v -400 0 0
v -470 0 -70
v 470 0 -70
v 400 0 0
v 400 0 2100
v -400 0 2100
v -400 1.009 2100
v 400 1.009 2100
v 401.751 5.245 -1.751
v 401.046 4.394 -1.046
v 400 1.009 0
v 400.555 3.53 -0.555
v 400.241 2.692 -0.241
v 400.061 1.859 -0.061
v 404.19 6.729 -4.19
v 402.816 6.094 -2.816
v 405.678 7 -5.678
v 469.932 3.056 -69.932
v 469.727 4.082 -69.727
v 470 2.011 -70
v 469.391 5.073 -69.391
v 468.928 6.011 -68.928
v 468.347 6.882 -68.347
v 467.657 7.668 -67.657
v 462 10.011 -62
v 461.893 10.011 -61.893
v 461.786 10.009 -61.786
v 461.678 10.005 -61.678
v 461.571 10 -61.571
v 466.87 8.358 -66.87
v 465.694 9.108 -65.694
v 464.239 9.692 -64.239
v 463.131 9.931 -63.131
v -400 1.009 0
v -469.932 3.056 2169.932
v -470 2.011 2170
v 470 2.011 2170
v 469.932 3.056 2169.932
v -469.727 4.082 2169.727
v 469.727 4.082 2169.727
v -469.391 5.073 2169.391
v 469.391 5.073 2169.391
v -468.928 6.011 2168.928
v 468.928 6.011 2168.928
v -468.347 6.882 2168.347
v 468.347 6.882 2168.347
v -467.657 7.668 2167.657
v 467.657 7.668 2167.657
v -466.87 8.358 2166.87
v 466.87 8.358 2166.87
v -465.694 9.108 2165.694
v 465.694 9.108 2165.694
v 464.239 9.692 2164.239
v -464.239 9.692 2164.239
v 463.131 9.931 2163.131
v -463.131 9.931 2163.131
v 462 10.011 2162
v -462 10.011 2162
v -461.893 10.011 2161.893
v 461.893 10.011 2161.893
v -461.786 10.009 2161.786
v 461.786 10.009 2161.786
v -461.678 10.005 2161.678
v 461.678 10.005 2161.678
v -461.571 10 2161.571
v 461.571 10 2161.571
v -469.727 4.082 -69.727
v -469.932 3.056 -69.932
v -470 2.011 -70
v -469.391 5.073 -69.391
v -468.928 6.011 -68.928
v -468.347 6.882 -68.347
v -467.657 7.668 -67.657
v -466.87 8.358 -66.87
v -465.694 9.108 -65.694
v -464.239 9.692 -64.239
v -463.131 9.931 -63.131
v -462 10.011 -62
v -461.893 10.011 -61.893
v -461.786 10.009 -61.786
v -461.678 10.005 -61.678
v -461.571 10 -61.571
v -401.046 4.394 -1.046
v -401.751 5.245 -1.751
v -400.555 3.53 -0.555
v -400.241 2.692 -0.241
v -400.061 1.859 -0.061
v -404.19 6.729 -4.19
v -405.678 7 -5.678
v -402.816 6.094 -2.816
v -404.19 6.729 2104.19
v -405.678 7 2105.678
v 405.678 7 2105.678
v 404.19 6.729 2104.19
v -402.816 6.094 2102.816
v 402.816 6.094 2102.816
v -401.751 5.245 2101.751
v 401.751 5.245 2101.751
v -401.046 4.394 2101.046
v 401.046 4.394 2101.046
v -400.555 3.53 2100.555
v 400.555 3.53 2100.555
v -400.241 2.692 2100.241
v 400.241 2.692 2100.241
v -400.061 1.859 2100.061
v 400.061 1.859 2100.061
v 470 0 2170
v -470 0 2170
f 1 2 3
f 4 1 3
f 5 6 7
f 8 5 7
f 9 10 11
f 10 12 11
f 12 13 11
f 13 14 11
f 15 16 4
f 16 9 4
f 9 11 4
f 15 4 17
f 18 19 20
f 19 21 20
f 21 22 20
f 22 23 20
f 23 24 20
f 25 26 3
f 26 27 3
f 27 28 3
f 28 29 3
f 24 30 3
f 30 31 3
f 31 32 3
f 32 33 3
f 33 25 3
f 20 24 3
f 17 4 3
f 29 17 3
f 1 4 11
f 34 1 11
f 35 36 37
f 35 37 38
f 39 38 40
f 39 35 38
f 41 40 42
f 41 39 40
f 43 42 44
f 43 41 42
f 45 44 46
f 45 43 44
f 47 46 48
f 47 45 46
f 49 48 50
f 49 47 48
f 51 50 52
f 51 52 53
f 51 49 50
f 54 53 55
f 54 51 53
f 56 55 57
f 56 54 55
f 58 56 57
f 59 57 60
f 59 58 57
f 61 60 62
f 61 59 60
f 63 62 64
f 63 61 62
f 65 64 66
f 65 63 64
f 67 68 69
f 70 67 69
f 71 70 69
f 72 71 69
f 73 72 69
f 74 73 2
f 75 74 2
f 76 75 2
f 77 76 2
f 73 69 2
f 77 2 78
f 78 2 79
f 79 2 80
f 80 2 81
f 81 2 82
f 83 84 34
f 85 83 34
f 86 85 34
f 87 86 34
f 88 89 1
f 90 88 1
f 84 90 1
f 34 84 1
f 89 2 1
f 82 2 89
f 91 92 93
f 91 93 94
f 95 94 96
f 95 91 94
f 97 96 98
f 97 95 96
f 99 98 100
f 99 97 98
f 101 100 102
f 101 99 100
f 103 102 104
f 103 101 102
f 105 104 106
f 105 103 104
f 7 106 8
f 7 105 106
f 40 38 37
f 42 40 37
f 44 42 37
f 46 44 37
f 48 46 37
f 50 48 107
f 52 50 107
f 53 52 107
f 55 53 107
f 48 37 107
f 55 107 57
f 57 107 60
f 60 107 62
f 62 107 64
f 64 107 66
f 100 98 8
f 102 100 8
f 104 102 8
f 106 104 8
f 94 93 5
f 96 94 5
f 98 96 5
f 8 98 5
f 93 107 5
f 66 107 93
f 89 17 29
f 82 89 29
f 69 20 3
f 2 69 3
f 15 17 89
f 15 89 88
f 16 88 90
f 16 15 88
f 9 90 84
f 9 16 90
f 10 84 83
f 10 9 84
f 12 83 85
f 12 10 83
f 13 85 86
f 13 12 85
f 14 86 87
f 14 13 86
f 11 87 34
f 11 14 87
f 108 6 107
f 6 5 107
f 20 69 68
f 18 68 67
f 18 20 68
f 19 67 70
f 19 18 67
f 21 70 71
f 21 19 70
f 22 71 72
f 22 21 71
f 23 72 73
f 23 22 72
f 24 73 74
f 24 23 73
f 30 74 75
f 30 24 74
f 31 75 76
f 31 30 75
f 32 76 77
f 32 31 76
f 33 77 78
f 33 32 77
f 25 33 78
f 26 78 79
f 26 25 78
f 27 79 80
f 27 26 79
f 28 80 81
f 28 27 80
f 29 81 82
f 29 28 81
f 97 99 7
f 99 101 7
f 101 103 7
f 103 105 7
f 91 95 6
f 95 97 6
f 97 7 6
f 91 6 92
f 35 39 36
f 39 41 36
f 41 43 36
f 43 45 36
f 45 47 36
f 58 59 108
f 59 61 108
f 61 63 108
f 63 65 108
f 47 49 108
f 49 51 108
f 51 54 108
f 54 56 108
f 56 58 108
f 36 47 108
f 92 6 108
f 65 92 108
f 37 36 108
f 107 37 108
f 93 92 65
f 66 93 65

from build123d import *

# Parameters (mm, degrees)
EXTRUDE039436_DEPTH = 500
EXTRUDE039434_DEPTH = 500


with BuildPart() as extrude039436_internal_inferior:
    # Sketch225 (on Sketch) → Extrude039436 (new body, symmetric)
    with BuildSketch(Plane.XZ):
        Polygon((-200, 200), (200, 200), (600, -200), (-600, -200), align=None)
    extrude(amount=EXTRUDE039436_DEPTH, both=True)


with BuildPart() as compound051:
    # Sketch223 (on Sketch) → Extrude039434 (new body, symmetric)
    with BuildSketch(Plane.XZ):
        Polygon((-600, 2300), (600, 2300), (200, 1900), (-200, 1900), align=None)
    extrude(amount=EXTRUDE039434_DEPTH, both=True)

    # Compound051: union Extrude039436_internal_inferior_
    add(extrude039436_internal_inferior.part)


with BuildPart() as trim_window_internal_horizontal:
    # Sweep012: sweep along a path in Sketch195
    with BuildLine(Plane.XZ) as sweep012_path:
        Line((-400, 2100), (-400, 0))
        Line((-400, 0), (400, 0))
        Line((400, 0), (400, 2100))
        Line((400, 2100), (-400, 2100))
    # Clone2D028 (on Sketch) → Sweep012 (sweep)
    with BuildSketch(Plane.ZY):
        with BuildLine():
            Line((-61.571224, 10), (-5.678418, 7))
            ThreePointArc((-5.678418, 7), (-1.645147, 5.136003), (0, 1.008624))
            Line((0, 1.008624), (0, 0))
            Line((0, 0), (-70, 0))
            Line((-70, 0), (-70, 2.011499))
            ThreePointArc((-70, 2.011499), (-67.503171, 7.81797), (-61.571224, 10))
        make_face()
    sweep(path=sweep012_path.line, is_frenet=True, transition=Transition.RIGHT)

    # Common002: intersect Compound051_
    add(compound051.part, mode=Mode.INTERSECT)


solid = trim_window_internal_horizontal.part
